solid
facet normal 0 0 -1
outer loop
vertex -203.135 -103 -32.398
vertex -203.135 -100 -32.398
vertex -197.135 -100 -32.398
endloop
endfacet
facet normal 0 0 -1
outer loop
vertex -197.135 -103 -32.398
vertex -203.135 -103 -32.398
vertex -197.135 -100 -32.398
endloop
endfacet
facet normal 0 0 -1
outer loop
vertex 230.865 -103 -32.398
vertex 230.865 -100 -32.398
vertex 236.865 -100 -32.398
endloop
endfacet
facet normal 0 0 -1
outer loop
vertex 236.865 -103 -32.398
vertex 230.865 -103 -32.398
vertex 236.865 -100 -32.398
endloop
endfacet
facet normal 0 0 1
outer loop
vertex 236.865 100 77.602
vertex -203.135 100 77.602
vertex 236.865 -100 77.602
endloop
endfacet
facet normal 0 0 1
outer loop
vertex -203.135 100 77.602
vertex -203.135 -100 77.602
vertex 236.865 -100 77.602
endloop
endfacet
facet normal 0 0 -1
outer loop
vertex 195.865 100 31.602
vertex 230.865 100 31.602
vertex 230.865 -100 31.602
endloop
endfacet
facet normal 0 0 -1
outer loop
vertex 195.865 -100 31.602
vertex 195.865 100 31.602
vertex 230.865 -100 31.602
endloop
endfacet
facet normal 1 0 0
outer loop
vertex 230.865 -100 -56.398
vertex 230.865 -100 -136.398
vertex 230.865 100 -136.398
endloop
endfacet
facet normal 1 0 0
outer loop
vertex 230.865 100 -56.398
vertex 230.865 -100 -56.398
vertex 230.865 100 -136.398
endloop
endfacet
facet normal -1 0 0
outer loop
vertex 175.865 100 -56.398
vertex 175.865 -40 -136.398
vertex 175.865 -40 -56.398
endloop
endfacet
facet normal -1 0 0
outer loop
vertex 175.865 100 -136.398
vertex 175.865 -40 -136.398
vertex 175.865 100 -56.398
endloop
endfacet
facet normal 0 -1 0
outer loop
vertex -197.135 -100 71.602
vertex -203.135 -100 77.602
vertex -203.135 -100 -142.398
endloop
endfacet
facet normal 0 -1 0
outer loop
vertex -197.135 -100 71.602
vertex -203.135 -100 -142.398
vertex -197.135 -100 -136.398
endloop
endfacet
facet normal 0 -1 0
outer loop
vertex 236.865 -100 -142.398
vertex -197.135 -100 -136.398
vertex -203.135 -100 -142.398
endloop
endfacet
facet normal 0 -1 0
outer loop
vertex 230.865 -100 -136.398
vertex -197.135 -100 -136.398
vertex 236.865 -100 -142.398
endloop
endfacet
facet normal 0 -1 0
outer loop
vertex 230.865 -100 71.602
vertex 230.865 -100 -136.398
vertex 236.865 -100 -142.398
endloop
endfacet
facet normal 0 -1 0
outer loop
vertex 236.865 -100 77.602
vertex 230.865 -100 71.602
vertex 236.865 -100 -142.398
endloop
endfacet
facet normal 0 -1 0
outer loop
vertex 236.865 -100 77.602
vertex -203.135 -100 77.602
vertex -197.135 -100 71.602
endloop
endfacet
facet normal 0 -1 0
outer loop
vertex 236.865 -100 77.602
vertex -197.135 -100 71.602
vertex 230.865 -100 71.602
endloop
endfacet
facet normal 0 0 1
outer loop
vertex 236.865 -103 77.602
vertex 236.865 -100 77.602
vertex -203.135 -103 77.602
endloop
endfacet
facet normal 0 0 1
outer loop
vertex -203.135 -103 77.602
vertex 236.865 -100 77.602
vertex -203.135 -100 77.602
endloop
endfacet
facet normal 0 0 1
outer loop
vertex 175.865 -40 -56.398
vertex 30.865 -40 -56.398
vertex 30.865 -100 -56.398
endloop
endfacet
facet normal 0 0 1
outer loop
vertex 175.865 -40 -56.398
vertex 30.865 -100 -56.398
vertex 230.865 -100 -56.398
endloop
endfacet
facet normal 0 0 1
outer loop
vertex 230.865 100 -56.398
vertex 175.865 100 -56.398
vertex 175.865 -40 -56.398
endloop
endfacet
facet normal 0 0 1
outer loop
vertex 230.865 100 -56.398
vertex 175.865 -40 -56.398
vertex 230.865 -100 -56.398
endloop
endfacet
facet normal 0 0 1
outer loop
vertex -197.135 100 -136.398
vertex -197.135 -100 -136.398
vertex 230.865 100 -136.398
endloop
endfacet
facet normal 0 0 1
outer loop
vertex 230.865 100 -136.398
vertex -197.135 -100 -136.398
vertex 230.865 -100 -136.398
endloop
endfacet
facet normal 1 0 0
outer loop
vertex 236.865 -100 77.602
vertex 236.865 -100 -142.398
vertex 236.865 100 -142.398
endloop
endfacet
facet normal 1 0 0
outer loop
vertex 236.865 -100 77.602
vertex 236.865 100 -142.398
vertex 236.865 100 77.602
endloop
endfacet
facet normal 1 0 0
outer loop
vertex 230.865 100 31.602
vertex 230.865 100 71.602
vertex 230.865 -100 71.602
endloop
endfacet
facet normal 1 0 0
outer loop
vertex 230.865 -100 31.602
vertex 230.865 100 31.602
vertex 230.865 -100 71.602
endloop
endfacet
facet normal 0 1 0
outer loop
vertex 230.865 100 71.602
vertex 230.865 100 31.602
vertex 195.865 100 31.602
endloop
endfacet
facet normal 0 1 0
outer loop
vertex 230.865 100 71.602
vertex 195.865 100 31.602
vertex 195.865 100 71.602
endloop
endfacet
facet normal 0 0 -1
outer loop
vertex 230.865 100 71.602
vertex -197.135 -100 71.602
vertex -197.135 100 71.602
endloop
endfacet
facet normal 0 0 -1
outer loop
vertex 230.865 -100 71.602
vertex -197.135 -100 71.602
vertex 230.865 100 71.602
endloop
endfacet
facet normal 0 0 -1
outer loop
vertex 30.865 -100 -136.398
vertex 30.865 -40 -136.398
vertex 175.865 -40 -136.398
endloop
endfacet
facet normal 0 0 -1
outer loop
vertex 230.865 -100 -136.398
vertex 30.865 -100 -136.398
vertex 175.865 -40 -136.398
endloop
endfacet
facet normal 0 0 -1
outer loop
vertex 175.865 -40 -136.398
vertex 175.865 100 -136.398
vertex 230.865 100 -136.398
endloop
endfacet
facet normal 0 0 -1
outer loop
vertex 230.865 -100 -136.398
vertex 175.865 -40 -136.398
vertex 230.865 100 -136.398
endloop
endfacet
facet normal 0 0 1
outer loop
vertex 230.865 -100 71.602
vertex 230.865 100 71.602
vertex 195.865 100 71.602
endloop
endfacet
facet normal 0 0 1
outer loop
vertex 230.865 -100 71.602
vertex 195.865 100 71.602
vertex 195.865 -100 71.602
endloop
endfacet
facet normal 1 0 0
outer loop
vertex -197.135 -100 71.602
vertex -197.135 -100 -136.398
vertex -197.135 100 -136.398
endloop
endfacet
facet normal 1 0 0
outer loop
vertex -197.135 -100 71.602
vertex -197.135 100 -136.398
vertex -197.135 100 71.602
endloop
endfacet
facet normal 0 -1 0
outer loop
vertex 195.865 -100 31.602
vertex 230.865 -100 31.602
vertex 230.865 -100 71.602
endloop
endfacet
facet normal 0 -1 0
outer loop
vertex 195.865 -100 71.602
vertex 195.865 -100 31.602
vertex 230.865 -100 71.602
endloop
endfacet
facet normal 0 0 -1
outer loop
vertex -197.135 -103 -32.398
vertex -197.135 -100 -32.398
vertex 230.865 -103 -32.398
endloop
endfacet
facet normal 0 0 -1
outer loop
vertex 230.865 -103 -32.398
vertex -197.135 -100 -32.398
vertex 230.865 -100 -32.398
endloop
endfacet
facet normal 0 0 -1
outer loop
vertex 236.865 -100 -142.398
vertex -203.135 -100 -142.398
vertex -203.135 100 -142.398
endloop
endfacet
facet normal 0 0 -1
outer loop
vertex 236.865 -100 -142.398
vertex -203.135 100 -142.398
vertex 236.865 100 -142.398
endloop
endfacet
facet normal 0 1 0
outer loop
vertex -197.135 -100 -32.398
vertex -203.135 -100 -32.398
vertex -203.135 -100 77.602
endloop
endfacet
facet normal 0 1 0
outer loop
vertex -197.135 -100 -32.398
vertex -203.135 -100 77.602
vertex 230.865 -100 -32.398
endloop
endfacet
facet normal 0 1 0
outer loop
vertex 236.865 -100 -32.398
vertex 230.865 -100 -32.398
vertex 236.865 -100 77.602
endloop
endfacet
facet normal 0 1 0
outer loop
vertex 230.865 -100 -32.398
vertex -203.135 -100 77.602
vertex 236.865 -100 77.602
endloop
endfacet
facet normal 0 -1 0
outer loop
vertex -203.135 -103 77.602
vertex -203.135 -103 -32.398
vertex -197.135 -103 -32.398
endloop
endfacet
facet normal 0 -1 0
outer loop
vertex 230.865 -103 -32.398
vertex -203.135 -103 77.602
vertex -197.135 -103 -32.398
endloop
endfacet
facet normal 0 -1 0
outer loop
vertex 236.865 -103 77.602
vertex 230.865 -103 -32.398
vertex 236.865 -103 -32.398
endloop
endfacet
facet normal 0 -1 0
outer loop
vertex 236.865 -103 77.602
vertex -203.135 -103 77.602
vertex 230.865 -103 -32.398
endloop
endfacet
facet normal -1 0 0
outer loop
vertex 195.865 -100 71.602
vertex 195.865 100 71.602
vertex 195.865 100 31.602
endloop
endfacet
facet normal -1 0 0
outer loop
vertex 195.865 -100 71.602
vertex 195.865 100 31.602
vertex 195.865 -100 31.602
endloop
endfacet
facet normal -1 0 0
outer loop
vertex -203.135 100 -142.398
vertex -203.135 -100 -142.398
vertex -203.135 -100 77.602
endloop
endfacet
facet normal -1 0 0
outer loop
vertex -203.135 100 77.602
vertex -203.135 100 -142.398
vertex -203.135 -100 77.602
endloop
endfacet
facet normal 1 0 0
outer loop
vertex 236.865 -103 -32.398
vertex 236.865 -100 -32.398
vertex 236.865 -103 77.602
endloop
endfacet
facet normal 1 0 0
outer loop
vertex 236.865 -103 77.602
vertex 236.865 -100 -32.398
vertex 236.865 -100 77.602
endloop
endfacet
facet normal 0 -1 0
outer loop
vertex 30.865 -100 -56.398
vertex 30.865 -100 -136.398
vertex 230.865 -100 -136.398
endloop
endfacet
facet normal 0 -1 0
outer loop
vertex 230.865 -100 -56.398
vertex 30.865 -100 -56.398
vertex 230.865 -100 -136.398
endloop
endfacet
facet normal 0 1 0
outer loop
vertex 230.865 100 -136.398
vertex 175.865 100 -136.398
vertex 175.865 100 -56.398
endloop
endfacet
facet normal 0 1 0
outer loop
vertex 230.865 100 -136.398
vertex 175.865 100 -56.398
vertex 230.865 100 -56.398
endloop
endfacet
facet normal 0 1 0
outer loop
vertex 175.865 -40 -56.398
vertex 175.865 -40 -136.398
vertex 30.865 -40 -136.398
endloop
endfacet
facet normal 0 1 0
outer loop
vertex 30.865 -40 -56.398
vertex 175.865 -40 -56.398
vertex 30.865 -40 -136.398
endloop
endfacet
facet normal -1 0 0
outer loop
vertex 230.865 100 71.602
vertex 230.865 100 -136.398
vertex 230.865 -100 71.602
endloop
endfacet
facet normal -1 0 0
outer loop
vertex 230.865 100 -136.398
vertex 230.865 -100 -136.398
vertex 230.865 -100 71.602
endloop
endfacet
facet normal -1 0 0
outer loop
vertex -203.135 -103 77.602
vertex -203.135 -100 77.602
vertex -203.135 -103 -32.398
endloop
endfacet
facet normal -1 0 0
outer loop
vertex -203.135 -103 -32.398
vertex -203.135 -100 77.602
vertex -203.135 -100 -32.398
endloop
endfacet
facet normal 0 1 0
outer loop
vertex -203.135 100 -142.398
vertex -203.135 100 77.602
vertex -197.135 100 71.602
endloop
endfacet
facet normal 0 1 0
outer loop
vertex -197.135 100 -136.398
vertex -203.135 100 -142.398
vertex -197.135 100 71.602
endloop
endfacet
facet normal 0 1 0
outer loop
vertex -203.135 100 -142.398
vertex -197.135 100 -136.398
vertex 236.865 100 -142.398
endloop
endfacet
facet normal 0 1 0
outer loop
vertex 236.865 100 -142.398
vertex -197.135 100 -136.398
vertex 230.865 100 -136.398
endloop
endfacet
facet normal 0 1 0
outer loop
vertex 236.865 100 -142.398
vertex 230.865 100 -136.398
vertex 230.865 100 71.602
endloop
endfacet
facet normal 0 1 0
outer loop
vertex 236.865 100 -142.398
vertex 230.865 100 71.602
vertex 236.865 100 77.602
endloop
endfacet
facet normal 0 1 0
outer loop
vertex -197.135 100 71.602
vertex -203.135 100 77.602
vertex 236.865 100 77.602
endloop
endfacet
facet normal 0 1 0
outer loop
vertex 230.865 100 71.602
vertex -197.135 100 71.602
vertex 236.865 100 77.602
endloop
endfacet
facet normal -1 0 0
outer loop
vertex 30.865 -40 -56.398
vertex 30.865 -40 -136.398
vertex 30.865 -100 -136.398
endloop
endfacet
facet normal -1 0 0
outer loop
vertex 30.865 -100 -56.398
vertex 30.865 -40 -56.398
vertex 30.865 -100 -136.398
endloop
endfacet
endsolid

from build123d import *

# Parameters (mm, degrees)
F0_W     = 440
F0_H     = 220
F0_W_2   = 427.999994
F0_H_2   = 207.999994
F1_DEPTH = 100
F2_W     = 427.999994
F2_H     = 103.999997
F3_DEPTH = 3
F4_W     = 55
F4_H     = 140
F5_DEPTH = 80
F6_W     = 200
F6_H     = 40
F7_DEPTH = 35


with BuildPart() as f1:
    # F0 (on Front) → F1 (new body, symmetric)
    with BuildSketch(Plane.XZ):
        with Locations((16.864836, -32.39839)):
            Rectangle(F0_W, F0_H)
        with Locations((16.864836, -32.39839)):
            Rectangle(F0_W_2, F0_H_2, mode=Mode.SUBTRACT)
    extrude(amount=F1_DEPTH, both=True)


with BuildPart() as f3:
    # F2 (on face) → F3 (new body)
    with BuildSketch(Plane.XZ.offset(100)):
        Polygon((236.864836, 77.60161), (-203.135164, 77.60161), (-203.135164, -32.39839), (-197.135161, -32.39839), (-197.135161, 71.601607), (230.864833, 71.601607), (230.864833, -32.39839), (236.864836, -32.39839), align=None)
        with Locations((16.864836, 19.601609)):
            Rectangle(F2_W, F2_H)
    extrude(amount=F3_DEPTH)


with BuildPart() as f5:
    # F4 (on face) → F5 (new body)
    with BuildSketch(Plane.XY.offset(-136.398387)):
        with Locations((203.364833, 30)):
            Rectangle(F4_W, F4_H)
        Polygon((30.864833, -100), (230.864833, -100), (230.864833, -40), (175.864833, -40), (30.864833, -40), align=None)
    extrude(amount=F5_DEPTH)


with BuildPart() as f7:
    # F6 (on face) → F7 (new body)
    with BuildSketch(Plane(origin=(230.864833, 0, 0), x_dir=(0, -1, 0), z_dir=(-1, 0, 0))):
        with Locations((0, 51.601607)):
            Rectangle(F6_W, F6_H)
    extrude(amount=F7_DEPTH)


solid = Compound([f1.part, f3.part, f5.part, f7.part])
